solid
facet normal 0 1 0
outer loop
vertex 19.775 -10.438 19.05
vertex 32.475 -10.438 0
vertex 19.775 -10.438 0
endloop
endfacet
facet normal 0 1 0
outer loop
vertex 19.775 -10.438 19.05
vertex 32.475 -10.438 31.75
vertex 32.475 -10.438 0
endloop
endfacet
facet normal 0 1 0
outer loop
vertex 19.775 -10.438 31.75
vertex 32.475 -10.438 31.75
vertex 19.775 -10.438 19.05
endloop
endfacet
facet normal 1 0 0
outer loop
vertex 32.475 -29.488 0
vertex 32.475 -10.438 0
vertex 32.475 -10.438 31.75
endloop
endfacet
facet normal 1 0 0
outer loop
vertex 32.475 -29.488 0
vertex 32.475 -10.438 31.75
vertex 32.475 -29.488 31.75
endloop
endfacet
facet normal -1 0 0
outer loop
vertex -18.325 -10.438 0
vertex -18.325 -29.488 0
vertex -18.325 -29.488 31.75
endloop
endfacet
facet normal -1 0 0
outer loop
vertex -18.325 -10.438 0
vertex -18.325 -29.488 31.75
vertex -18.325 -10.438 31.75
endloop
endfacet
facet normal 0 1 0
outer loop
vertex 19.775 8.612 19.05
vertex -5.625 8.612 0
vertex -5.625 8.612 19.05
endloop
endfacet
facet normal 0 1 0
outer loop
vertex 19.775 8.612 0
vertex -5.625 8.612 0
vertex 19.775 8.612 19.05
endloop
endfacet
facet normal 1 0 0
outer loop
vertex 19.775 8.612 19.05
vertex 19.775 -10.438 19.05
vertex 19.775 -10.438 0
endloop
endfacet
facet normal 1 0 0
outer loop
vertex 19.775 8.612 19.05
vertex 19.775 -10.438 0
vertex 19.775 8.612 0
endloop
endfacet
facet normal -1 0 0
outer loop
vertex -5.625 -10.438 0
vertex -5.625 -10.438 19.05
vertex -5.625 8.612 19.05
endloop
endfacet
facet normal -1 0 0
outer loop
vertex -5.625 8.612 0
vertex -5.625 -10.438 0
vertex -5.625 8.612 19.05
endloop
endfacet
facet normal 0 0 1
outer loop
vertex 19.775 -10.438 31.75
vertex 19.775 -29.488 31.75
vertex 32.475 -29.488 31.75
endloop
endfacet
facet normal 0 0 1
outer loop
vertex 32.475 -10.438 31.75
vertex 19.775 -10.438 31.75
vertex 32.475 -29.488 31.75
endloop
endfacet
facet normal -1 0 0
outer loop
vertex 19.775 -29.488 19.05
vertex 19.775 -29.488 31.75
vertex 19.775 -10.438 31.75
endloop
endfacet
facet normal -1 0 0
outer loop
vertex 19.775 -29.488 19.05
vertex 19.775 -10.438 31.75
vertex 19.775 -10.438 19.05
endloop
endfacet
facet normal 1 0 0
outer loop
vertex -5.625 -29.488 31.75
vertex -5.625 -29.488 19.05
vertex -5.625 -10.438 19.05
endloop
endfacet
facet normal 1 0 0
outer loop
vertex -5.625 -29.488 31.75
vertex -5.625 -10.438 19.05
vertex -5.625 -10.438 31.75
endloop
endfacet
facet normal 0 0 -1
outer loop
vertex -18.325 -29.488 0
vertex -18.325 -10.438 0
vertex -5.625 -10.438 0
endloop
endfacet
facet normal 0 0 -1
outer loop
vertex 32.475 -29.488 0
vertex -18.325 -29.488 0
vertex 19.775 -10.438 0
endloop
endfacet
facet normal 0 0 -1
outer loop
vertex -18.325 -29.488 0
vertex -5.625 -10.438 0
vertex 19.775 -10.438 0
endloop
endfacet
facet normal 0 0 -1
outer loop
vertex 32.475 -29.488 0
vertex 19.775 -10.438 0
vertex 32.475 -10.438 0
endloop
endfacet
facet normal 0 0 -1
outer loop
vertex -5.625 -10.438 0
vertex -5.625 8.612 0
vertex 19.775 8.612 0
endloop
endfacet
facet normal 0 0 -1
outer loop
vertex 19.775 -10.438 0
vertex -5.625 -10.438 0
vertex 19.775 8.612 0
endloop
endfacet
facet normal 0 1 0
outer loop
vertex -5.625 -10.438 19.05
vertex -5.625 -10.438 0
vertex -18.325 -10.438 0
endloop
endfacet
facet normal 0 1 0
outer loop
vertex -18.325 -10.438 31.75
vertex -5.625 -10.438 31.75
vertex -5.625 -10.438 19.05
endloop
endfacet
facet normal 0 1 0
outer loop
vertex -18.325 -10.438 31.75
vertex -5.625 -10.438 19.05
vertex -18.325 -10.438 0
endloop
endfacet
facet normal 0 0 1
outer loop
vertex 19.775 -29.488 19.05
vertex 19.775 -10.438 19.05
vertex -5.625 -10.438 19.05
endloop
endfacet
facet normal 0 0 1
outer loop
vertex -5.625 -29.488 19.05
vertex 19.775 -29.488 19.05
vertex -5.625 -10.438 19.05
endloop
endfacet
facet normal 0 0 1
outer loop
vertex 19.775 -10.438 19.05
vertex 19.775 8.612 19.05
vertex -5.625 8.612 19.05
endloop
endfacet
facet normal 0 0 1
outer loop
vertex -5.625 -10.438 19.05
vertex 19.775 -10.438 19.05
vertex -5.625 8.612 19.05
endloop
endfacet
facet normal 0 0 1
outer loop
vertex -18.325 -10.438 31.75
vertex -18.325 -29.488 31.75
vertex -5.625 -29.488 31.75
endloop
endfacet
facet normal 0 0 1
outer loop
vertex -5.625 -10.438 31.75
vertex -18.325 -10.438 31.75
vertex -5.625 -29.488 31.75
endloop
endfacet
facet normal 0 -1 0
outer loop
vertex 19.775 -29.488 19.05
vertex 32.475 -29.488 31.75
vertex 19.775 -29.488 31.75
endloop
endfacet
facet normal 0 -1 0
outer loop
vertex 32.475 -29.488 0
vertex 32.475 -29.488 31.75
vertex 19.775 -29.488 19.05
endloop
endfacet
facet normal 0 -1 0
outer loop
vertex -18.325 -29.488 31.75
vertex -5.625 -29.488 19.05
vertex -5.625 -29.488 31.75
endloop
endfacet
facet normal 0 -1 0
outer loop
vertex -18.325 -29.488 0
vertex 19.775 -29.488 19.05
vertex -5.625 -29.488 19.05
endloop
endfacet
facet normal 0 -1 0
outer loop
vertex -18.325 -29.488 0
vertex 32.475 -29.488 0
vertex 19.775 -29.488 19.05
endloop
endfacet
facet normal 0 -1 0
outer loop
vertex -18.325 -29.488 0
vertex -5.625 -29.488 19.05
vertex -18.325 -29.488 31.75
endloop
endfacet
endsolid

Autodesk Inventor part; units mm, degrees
ref_plane "YZ Plane" through (0, 0, 0) normal (1, 0, 0) x (0, 1, 0)
ref_plane "XZ Plane" through (0, 0, 0) normal (0, 1, 0) x (-1, 0, 0)
ref_plane "XY Plane" through (0, 0, 0) normal (0, 0, 1) x (1, 0, 0)
sketch "Sketch1" plane through (0, 0, 0) normal (0, 0, 1) x (1, 0, 0)
  line L0 (-18.3251, 8.6116) -> (32.4749, 8.6116)
  line L1 (32.4749, 8.6116) -> (32.4749, -29.4884)
  line L2 (32.4749, -29.4884) -> (-18.3251, -29.4884)
  line L3 (-18.3251, -29.4884) -> (-18.3251, 8.6116)
  point P0 (0, 0)
  dimension "d0" = 50.8
  dimension "d1" = 38.1
extrude "Extrusion1" add sketch "Sketch1" along normal blind 31.75
sketch "Sketch2" plane through (-18.3251, 8.6116, 0) normal (0, 1, 0) x (1, 0, 0)
  line L0 (50.8, -31.75) -> (0, -31.75) projected
  line L1 (12.7, -31.75) -> (38.1, -31.75)
  line L2 (38.1, -31.75) -> (38.1, -19.05)
  line L3 (38.1, -19.05) -> (12.7, -19.05)
  line L4 (12.7, -19.05) -> (12.7, -31.75)
  line L5 (50.8, 0) -> (50.8, -31.75) projected
  point P0 (18.3251, 0)
  dimension "d4" = 12.7
  dimension "d5" = 25.4
  dimension "d6" = 12.7
extrude "Extrusion2" cut sketch "Sketch2" against normal blind 38.1
sketch "Sketch3" plane through (0, 0, 31.75) normal (0, 0, 1) x (1, 0, 0)
  line L0 (32.4749, -29.4884) -> (32.4749, 8.6116) projected
  line L1 (19.7749, 8.6116) -> (32.4749, 8.6116)
  line L2 (32.4749, 8.6116) -> (32.4749, -10.4384)
  line L3 (32.4749, -10.4384) -> (19.7749, -10.4384)
  line L4 (19.7749, -10.4384) -> (19.7749, 8.6116)
  line L5 (-5.6251, 8.6116) -> (-18.3251, 8.6116) projected
  line L6 (-5.6251, -29.4884) -> (-5.6251, 8.6116) projected
  line L7 (-18.3251, 8.6116) -> (-5.6251, 8.6116)
  line L8 (-5.6251, 8.6116) -> (-5.6251, -10.4384)
  line L9 (-5.6251, -10.4384) -> (-18.3251, -10.4384)
  line L10 (-18.3251, -10.4384) -> (-18.3251, 8.6116)
  line L11 (-18.3251, -29.4884) -> (-5.6251, -29.4884) projected
  line L12 (19.7749, -29.4884) -> (32.4749, -29.4884) projected
  point P0 (0, 0)
  dimension "d9" = 19.05
  dimension "d10" = 19.05
extrude "Extrusion3" cut sketch "Sketch3" against normal blind 38.1
properties part number "Figure 7_27_7"
